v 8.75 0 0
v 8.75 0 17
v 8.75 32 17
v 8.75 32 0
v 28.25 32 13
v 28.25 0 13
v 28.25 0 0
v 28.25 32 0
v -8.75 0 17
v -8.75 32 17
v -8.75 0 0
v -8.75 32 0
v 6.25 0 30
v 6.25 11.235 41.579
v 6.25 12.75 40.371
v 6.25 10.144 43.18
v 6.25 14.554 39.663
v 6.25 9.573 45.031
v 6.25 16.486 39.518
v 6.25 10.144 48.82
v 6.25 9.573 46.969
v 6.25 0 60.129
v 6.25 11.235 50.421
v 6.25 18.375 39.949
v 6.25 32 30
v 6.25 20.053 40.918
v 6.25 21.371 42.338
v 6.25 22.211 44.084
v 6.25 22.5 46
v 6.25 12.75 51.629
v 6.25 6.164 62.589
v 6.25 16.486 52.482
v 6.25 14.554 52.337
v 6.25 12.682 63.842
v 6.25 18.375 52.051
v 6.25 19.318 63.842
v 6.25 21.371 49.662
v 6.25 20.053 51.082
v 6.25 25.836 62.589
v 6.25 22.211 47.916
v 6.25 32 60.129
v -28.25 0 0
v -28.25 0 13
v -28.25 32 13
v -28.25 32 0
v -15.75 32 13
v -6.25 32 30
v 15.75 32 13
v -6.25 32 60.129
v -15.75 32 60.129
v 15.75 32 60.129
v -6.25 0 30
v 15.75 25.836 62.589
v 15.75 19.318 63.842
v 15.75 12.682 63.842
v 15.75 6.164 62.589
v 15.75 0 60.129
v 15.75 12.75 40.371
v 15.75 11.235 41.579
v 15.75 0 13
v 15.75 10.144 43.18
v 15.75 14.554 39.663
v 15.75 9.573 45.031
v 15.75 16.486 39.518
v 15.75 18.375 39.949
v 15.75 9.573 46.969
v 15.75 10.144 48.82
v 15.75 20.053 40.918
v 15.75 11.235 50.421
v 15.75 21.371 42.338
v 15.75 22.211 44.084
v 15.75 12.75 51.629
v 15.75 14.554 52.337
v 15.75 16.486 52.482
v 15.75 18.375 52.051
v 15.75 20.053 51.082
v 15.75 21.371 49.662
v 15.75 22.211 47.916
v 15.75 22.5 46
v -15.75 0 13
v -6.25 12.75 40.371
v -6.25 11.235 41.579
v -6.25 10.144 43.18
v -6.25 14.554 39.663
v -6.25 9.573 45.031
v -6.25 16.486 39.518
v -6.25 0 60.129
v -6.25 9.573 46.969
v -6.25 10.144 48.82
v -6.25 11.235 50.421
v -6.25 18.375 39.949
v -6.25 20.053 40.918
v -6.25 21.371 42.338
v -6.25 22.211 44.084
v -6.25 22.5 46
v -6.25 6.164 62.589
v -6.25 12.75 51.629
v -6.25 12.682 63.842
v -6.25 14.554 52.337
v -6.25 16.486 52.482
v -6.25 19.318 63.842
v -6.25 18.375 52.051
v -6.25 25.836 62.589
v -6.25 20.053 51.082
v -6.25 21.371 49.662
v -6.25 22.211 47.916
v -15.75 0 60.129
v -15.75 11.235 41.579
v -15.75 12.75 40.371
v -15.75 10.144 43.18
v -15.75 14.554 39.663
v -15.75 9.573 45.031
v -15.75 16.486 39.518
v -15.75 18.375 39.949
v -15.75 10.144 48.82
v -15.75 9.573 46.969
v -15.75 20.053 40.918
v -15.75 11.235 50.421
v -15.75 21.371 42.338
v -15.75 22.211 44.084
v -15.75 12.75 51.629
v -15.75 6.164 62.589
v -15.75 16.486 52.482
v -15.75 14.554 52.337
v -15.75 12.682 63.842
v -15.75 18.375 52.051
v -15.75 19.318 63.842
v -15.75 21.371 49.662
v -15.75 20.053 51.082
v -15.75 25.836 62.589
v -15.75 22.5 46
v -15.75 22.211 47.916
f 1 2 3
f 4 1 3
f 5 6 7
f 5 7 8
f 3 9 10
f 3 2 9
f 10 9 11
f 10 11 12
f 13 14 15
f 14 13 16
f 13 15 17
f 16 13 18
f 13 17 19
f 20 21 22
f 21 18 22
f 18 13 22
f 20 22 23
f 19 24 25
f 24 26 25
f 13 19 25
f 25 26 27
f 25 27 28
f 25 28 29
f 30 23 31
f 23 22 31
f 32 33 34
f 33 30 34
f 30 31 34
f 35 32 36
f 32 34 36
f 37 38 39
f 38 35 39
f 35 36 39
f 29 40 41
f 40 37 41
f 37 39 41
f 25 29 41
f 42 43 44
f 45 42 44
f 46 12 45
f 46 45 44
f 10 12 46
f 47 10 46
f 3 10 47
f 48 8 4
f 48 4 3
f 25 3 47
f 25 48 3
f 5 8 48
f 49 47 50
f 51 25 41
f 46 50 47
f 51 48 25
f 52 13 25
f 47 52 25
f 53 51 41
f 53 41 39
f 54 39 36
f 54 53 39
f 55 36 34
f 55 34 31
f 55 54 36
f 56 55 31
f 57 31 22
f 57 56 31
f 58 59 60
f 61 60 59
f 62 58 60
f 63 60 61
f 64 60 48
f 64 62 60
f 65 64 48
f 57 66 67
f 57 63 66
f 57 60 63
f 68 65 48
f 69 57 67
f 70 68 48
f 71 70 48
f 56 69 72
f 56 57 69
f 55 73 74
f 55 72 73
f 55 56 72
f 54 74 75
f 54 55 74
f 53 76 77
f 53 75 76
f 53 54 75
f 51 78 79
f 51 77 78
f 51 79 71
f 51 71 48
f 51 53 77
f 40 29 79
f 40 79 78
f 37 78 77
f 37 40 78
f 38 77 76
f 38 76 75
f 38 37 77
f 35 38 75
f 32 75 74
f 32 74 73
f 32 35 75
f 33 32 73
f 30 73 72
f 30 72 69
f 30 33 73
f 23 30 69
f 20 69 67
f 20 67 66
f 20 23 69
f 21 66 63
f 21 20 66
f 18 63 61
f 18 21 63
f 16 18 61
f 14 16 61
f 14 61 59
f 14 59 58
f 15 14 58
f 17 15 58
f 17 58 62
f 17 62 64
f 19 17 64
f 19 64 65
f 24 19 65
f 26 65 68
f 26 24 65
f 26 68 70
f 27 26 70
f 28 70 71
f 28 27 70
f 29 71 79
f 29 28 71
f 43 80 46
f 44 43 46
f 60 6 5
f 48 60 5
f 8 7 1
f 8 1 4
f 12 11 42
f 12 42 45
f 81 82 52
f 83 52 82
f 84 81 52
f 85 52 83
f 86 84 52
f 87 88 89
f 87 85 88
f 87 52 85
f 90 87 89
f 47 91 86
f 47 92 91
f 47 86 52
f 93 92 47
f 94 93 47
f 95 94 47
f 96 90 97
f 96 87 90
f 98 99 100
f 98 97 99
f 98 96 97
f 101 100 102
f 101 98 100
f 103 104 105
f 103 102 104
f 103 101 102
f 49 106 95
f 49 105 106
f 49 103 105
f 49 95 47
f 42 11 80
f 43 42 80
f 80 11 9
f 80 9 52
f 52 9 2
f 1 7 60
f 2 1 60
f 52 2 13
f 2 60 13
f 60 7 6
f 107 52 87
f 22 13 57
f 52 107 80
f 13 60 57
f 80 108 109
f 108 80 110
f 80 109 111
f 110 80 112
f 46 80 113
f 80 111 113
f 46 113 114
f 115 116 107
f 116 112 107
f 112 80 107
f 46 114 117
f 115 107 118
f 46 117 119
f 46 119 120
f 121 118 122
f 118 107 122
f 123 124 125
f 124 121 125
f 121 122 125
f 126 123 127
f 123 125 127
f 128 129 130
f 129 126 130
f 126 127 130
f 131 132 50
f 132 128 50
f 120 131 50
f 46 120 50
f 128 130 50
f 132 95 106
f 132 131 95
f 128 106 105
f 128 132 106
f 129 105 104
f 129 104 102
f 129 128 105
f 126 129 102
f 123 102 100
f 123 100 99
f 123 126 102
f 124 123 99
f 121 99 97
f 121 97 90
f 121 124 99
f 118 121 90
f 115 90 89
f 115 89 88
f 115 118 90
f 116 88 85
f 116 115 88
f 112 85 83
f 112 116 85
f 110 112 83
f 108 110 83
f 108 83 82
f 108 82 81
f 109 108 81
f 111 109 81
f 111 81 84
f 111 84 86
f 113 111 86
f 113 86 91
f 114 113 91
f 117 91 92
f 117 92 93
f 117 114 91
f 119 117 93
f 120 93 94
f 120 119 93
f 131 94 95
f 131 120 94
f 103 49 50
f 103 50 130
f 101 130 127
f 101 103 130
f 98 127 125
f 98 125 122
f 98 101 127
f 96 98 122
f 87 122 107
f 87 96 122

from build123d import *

# Parameters (mm, degrees)
F0_W     = 32
F0_H     = 13
F1_DEPTH = 28.25
F0_H_2   = 4
F0_R     = 6.5
F2_DEPTH = 15.75
F3_DEPTH = 6.25
F4_DEPTH = 8.75
F6_R     = 6.5
F7_DEPTH = 50


with BuildPart() as f1:
    # F0 (on Right) → F1 (new body, symmetric)
    with BuildSketch(Plane.YZ):
        with Locations((16, 6.5)):
            Rectangle(F0_W, F0_H)
    extrude(amount=F1_DEPTH, both=True)

    # F0 (on Right) → F2 (join, symmetric)
    with BuildSketch(Plane.YZ):
        with Locations((16, 23.5)):
            Rectangle(F0_W, F0_H)
        with Locations((16, 15)):
            Rectangle(F0_W, F0_H_2)
        with BuildLine():
            Line((0, 60.128765), (0, 30))
            Line((0, 30), (32, 30))
            Line((32, 30), (32, 60.128765))
            ThreePointArc((32, 60.128765), (16, 64), (0, 60.128765))
        make_face()
        with Locations((16, 46)):
            Circle(F0_R, mode=Mode.SUBTRACT)
    extrude(amount=F2_DEPTH, both=True)

    # F0 (on Right) → F3 (cut, symmetric)
    with BuildSketch(Plane.YZ):
        with BuildLine():
            Line((0, 60.128765), (0, 30))
            Line((0, 30), (32, 30))
            Line((32, 30), (32, 60.128765))
            ThreePointArc((32, 60.128765), (16, 64), (0, 60.128765))
        make_face()
        with Locations((16, 46)):
            Circle(F0_R, mode=Mode.SUBTRACT)
    extrude(amount=F3_DEPTH, both=True, mode=Mode.SUBTRACT)

    # F0 (on Right) → F4 (cut, symmetric)
    with BuildSketch(Plane.YZ):
        with Locations((16, 15)):
            Rectangle(F0_W, F0_H_2)
        with Locations((16, 6.5)):
            Rectangle(F0_W, F0_H)
    extrude(amount=F4_DEPTH, both=True, mode=Mode.SUBTRACT)


with BuildPart() as f7:
    # F6 (on offset) → F7 (new body)
    with BuildSketch(Plane(origin=(40.75, 16, 37.144454), x_dir=(0, 1, 0), z_dir=(1, 0, 0))):
        with Locations((16, 46)):
            Circle(F6_R)
    extrude(amount=F7_DEPTH)


solid = f1.part
